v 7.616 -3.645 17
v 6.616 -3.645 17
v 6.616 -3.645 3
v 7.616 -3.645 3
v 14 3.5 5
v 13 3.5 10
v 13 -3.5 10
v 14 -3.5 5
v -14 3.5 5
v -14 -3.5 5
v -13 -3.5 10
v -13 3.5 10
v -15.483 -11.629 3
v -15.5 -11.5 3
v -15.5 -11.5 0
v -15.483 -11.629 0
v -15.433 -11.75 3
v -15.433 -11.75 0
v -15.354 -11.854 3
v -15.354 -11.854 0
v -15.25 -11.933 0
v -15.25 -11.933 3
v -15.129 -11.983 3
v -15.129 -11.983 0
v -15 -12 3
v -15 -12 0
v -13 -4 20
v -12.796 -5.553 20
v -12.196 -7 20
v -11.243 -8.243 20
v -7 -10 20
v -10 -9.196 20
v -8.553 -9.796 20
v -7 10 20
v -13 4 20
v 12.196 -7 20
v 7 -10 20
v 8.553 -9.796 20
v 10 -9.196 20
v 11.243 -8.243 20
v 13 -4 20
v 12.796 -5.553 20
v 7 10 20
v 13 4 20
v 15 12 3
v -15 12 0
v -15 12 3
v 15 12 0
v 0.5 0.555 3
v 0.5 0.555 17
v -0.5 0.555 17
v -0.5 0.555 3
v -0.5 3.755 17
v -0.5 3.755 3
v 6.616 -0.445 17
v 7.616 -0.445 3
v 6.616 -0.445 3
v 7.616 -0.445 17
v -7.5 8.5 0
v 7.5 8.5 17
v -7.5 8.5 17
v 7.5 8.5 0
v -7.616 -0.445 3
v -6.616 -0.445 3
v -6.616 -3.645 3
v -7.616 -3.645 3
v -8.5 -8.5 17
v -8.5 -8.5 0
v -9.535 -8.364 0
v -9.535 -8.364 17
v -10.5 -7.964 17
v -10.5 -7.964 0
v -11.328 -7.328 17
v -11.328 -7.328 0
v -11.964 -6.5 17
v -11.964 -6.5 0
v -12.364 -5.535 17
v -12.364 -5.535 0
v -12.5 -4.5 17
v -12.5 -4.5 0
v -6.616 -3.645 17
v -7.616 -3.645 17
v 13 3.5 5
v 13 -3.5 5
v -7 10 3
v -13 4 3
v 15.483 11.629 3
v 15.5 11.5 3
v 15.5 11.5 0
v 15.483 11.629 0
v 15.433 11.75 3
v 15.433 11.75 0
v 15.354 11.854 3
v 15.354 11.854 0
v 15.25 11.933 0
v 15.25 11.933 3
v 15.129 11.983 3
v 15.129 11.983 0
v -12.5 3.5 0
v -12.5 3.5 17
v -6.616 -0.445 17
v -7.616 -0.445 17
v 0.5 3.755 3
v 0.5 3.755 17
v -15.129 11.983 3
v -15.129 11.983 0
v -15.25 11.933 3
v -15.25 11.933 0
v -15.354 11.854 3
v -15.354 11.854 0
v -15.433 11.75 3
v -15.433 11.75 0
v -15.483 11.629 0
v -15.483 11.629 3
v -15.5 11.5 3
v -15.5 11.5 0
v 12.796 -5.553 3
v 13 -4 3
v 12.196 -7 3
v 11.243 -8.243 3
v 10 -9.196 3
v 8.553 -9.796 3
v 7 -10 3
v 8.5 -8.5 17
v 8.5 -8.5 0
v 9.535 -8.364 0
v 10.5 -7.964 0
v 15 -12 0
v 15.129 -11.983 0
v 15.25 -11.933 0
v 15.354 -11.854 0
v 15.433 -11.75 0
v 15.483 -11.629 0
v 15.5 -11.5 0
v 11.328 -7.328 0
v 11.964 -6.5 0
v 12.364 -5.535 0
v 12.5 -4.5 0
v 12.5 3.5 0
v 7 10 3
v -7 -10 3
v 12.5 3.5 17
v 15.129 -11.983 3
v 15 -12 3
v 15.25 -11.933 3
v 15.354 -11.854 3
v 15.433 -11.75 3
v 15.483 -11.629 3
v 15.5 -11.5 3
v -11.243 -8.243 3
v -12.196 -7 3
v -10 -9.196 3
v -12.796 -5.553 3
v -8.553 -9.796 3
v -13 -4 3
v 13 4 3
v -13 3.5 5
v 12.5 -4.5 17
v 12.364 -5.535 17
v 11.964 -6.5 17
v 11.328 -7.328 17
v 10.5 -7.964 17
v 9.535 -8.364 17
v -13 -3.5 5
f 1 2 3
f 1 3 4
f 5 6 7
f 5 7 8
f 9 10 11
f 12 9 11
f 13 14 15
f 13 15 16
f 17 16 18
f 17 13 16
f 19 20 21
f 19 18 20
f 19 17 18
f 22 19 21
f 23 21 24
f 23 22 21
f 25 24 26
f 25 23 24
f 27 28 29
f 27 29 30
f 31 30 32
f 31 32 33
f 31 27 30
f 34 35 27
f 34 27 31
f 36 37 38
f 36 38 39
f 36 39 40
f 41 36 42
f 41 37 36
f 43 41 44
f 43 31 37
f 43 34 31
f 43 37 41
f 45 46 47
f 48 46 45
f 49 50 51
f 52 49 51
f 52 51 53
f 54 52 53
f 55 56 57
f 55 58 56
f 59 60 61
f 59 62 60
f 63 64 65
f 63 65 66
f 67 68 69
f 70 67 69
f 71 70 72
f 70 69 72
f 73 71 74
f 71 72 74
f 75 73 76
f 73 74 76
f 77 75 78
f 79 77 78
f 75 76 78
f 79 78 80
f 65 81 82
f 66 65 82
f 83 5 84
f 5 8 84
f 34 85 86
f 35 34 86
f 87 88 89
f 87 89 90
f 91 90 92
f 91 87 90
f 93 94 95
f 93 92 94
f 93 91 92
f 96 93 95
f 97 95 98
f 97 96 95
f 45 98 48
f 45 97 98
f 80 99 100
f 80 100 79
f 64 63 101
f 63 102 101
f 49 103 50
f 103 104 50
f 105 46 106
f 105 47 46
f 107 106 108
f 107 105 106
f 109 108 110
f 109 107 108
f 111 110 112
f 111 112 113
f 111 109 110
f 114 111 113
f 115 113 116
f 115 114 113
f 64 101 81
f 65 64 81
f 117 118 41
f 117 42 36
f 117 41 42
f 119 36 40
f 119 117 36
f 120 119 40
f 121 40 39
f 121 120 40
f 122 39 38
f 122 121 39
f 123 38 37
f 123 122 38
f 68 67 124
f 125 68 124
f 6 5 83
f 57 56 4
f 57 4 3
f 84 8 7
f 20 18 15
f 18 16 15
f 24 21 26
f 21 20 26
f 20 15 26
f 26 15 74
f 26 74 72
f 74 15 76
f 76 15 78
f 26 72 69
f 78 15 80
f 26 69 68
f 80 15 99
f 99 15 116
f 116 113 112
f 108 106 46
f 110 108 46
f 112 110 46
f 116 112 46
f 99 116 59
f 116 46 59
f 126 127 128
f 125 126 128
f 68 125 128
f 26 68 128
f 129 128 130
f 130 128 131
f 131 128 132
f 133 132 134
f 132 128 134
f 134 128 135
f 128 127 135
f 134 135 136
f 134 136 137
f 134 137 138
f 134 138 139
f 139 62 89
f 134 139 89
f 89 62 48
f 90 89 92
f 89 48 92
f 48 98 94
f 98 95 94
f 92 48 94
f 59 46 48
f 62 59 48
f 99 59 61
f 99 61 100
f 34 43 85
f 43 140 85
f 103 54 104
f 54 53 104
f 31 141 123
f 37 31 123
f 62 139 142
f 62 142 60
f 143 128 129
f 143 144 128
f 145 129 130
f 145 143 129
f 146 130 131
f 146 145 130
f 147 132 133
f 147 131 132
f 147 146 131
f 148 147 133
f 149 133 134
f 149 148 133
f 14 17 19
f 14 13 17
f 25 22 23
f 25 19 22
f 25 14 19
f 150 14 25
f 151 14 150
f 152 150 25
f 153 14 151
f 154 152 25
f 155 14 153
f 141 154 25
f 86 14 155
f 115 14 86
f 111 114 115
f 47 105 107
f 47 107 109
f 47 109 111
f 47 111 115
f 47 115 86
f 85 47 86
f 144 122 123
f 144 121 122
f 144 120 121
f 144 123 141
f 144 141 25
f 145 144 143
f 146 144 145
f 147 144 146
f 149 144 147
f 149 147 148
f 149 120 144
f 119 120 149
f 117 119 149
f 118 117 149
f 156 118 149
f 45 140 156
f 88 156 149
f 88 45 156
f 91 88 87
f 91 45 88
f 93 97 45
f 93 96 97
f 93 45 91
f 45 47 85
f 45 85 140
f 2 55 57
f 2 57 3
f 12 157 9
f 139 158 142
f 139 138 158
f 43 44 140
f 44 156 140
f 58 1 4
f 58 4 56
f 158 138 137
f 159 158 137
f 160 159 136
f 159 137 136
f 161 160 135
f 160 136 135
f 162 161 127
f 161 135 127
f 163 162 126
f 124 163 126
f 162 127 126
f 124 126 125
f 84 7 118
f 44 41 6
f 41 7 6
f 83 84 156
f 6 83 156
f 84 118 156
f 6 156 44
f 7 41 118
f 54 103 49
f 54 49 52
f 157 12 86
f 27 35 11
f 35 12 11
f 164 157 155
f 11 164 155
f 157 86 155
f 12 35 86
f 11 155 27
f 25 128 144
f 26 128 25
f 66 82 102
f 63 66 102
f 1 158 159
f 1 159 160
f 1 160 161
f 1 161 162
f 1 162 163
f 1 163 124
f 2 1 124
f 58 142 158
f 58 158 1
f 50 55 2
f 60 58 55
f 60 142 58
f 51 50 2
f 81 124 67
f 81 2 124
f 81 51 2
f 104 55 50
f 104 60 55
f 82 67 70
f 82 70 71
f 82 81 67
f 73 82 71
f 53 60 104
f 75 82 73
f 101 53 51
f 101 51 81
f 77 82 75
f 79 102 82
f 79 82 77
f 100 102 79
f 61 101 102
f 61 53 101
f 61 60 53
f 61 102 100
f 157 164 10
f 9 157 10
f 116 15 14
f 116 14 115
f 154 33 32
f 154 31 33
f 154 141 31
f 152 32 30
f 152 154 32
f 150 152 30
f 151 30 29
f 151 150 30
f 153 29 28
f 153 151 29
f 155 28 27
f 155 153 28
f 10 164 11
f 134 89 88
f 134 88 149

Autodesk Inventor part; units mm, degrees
ref_plane "YZ Plane" through (0, 0, 0) normal (1, 0, 0) x (0, 1, 0)
ref_plane "XZ Plane" through (0, 0, 0) normal (0, 1, 0) x (-1, 0, 0)
ref_plane "XY Plane" through (0, 0, 0) normal (0, 0, 1) x (1, 0, 0)
sketch "Sketch1" plane through (0, 0, 0) normal (0, 0, 1) x (1, 0, 0)
  line L0 (-15.5, 12) -> (15.5, 12)
  line L1 (15.5, 12) -> (15.5, -12)
  line L2 (15.5, -12) -> (-15.5, -12)
  line L3 (-15.5, -12) -> (-15.5, 12)
  line L4 (-15.5, 12) -> (15.5, -12) construction
  line L5 (15.5, 12) -> (-15.5, -12) construction
  point P0 (0, 0)
  dimension "d0" = 24
  dimension "d1" = 31
extrude "Extrusion1" add sketch "Sketch1" along normal blind 3
fillet "Fillet1" radius 0.5 4 edges at (15.5, 12, 1.5) (15.5, -12, 1.5) (-15.5, -12, 1.5) (-15.5, 12, 1.5)
sketch "Sketch4" plane through (0, 0, 3) normal (0, 0, 1) x (1, 0, 0)
  line L0 (-7, -10) -> (7, -10)
  line L1 (13, -4) -> (13, 4)
  line L2 (7, 10) -> (-7, 10)
  line L3 (-13, 4) -> (-13, -4)
  line L4 (-13, -10) -> (13, 10) construction
  line L5 (13, -10) -> (-13, 10) construction
  arc A0 (-13, -4) -> (-7, -10) centre (-7, -4) ccw
  arc A1 (7, -10) -> (13, -4) centre (7, -4) ccw
  line L6 (-7, 10) -> (-13, 4)
  line L7 (13, 4) -> (7, 10)
  point P0 (0, 0)
  point P1 (0, 0)
  dimension "d13" = 20
  dimension "d14" = 26
  dimension "d41" = 6
  dimension "d42" = 6
  dimension "d43" = 6
  dimension "d44" = 6
  dimension "d45" = 6
extrude "Extrusion4" add sketch "Sketch4" along normal blind 17
sketch "Sketch8" plane through (0, 0, 0) normal (0, 1, 0) x (-1, 0, 0)
  line L0 (-13, 10) -> (-14, 5)
  line L1 (-14, 5) -> (-13, 5)
  line L2 (-15, 3) -> (15, 3) projected
  line L3 (-13, 5) -> (-13, 10)
  line L4 (-13, 3) -> (-13, 20) projected
  point P0 (0, 0)
  dimension "d36" = 2
  dimension "d37" = 1
  dimension "d38" = 5
extrude "Extrusion7" add sketch "Sketch8" along normal mid plane 7
mirror "Mirror1" about plane through (0, 0, 0) normal (1, 0, 0) of "Extrusion7"
sketch "Sketch5" plane through (0, 0, 0) normal (0, 0, -1) x (-1, 0, 0)
  line L0 (-7.5, 8.5) -> (7.5, 8.5)
  line L1 (12.5, 3.5) -> (12.5, -4.5)
  line L2 (8.5, -8.5) -> (-8.5, -8.5)
  line L3 (-12.5, -4.5) -> (-12.5, 3.5)
  line L4 (-12.5, 8.5) -> (12.5, -8.5) construction
  line L5 (12.5, 8.5) -> (-12.5, -8.5) construction
  line L6 (-12.5, 3.5) -> (-7.5, 8.5)
  line L7 (7.5, 8.5) -> (12.5, 3.5)
  arc A0 (-12.5, -4.5) -> (-8.5, -8.5) centre (-8.5, -4.5) ccw
  arc A1 (8.5, -8.5) -> (12.5, -4.5) centre (8.5, -4.5) ccw
  point P0 (0, 0)
  dimension "d18" = 17
  dimension "d19" = 25
  dimension "d20" = 5
  dimension "d21" = 5
  dimension "d22" = 5
  dimension "d23" = 5
  dimension "d24" = 4
extrude "Extrusion5" cut sketch "Sketch5" against normal blind 17
sketch "Sketch7" plane through (0, 0, 17) normal (0, 0, -1) x (-1, 0, 0)
  line L0 (0.5, 3.7551) -> (-0.5, 3.7551)
  line L1 (-0.5, 3.7551) -> (-0.5, 0.5551)
  line L2 (-0.5, 0.5551) -> (0.5, 0.5551)
  line L3 (0.5, 0.5551) -> (0.5, 3.7551)
  line L4 (0.5, 3.7551) -> (-0.5, 0.5551) construction
  line L5 (-0.5, 3.7551) -> (0.5, 0.5551) construction
  line L6 (7.6155, -0.4449) -> (6.6155, -0.4449)
  line L7 (6.6155, -0.4449) -> (6.6155, -3.6449)
  line L8 (6.6155, -3.6449) -> (7.6155, -3.6449)
  line L9 (7.6155, -3.6449) -> (7.6155, -0.4449)
  line L10 (7.6155, -0.4449) -> (6.6155, -3.6449) construction
  line L11 (6.6155, -0.4449) -> (7.6155, -3.6449) construction
  line L12 (0, 0) -> (0, -2.165)
  line L13 (-7.6155, -0.4449) -> (-6.6155, -0.4449)
  line L14 (-6.6155, -0.4449) -> (-6.6155, -3.6449)
  line L15 (-6.6155, -3.6449) -> (-7.6155, -3.6449)
  line L16 (-7.6155, -3.6449) -> (-7.6155, -0.4449)
  line L17 (-7.6155, -0.4449) -> (-6.6155, -3.6449) construction
  line L18 (-6.6155, -0.4449) -> (-7.6155, -3.6449) construction
  point P0 (0, 2.1551)
  point P1 (7.1155, -2.0449)
  point P2 (-7.1155, -2.0449)
  point P3 (-7.1155, -0.4449)
  dimension "d27" = 1
  dimension "d28" = 1
  dimension "d29" = 3.2
  dimension "d30" = 3.2
  dimension "d35" = 1
extrude "Extrusion6" add sketch "Sketch7" along normal blind 14
equation "\"d43\" = d42"
equation "\"d44\" = d42"
equation "\"d45\" = d44"
equation "\"d21\" = d20"
equation "\"d22\" = d20"
equation "\"d23\" = d22"
properties part number "power_socket_24V_2" material "ABS Plastic"
